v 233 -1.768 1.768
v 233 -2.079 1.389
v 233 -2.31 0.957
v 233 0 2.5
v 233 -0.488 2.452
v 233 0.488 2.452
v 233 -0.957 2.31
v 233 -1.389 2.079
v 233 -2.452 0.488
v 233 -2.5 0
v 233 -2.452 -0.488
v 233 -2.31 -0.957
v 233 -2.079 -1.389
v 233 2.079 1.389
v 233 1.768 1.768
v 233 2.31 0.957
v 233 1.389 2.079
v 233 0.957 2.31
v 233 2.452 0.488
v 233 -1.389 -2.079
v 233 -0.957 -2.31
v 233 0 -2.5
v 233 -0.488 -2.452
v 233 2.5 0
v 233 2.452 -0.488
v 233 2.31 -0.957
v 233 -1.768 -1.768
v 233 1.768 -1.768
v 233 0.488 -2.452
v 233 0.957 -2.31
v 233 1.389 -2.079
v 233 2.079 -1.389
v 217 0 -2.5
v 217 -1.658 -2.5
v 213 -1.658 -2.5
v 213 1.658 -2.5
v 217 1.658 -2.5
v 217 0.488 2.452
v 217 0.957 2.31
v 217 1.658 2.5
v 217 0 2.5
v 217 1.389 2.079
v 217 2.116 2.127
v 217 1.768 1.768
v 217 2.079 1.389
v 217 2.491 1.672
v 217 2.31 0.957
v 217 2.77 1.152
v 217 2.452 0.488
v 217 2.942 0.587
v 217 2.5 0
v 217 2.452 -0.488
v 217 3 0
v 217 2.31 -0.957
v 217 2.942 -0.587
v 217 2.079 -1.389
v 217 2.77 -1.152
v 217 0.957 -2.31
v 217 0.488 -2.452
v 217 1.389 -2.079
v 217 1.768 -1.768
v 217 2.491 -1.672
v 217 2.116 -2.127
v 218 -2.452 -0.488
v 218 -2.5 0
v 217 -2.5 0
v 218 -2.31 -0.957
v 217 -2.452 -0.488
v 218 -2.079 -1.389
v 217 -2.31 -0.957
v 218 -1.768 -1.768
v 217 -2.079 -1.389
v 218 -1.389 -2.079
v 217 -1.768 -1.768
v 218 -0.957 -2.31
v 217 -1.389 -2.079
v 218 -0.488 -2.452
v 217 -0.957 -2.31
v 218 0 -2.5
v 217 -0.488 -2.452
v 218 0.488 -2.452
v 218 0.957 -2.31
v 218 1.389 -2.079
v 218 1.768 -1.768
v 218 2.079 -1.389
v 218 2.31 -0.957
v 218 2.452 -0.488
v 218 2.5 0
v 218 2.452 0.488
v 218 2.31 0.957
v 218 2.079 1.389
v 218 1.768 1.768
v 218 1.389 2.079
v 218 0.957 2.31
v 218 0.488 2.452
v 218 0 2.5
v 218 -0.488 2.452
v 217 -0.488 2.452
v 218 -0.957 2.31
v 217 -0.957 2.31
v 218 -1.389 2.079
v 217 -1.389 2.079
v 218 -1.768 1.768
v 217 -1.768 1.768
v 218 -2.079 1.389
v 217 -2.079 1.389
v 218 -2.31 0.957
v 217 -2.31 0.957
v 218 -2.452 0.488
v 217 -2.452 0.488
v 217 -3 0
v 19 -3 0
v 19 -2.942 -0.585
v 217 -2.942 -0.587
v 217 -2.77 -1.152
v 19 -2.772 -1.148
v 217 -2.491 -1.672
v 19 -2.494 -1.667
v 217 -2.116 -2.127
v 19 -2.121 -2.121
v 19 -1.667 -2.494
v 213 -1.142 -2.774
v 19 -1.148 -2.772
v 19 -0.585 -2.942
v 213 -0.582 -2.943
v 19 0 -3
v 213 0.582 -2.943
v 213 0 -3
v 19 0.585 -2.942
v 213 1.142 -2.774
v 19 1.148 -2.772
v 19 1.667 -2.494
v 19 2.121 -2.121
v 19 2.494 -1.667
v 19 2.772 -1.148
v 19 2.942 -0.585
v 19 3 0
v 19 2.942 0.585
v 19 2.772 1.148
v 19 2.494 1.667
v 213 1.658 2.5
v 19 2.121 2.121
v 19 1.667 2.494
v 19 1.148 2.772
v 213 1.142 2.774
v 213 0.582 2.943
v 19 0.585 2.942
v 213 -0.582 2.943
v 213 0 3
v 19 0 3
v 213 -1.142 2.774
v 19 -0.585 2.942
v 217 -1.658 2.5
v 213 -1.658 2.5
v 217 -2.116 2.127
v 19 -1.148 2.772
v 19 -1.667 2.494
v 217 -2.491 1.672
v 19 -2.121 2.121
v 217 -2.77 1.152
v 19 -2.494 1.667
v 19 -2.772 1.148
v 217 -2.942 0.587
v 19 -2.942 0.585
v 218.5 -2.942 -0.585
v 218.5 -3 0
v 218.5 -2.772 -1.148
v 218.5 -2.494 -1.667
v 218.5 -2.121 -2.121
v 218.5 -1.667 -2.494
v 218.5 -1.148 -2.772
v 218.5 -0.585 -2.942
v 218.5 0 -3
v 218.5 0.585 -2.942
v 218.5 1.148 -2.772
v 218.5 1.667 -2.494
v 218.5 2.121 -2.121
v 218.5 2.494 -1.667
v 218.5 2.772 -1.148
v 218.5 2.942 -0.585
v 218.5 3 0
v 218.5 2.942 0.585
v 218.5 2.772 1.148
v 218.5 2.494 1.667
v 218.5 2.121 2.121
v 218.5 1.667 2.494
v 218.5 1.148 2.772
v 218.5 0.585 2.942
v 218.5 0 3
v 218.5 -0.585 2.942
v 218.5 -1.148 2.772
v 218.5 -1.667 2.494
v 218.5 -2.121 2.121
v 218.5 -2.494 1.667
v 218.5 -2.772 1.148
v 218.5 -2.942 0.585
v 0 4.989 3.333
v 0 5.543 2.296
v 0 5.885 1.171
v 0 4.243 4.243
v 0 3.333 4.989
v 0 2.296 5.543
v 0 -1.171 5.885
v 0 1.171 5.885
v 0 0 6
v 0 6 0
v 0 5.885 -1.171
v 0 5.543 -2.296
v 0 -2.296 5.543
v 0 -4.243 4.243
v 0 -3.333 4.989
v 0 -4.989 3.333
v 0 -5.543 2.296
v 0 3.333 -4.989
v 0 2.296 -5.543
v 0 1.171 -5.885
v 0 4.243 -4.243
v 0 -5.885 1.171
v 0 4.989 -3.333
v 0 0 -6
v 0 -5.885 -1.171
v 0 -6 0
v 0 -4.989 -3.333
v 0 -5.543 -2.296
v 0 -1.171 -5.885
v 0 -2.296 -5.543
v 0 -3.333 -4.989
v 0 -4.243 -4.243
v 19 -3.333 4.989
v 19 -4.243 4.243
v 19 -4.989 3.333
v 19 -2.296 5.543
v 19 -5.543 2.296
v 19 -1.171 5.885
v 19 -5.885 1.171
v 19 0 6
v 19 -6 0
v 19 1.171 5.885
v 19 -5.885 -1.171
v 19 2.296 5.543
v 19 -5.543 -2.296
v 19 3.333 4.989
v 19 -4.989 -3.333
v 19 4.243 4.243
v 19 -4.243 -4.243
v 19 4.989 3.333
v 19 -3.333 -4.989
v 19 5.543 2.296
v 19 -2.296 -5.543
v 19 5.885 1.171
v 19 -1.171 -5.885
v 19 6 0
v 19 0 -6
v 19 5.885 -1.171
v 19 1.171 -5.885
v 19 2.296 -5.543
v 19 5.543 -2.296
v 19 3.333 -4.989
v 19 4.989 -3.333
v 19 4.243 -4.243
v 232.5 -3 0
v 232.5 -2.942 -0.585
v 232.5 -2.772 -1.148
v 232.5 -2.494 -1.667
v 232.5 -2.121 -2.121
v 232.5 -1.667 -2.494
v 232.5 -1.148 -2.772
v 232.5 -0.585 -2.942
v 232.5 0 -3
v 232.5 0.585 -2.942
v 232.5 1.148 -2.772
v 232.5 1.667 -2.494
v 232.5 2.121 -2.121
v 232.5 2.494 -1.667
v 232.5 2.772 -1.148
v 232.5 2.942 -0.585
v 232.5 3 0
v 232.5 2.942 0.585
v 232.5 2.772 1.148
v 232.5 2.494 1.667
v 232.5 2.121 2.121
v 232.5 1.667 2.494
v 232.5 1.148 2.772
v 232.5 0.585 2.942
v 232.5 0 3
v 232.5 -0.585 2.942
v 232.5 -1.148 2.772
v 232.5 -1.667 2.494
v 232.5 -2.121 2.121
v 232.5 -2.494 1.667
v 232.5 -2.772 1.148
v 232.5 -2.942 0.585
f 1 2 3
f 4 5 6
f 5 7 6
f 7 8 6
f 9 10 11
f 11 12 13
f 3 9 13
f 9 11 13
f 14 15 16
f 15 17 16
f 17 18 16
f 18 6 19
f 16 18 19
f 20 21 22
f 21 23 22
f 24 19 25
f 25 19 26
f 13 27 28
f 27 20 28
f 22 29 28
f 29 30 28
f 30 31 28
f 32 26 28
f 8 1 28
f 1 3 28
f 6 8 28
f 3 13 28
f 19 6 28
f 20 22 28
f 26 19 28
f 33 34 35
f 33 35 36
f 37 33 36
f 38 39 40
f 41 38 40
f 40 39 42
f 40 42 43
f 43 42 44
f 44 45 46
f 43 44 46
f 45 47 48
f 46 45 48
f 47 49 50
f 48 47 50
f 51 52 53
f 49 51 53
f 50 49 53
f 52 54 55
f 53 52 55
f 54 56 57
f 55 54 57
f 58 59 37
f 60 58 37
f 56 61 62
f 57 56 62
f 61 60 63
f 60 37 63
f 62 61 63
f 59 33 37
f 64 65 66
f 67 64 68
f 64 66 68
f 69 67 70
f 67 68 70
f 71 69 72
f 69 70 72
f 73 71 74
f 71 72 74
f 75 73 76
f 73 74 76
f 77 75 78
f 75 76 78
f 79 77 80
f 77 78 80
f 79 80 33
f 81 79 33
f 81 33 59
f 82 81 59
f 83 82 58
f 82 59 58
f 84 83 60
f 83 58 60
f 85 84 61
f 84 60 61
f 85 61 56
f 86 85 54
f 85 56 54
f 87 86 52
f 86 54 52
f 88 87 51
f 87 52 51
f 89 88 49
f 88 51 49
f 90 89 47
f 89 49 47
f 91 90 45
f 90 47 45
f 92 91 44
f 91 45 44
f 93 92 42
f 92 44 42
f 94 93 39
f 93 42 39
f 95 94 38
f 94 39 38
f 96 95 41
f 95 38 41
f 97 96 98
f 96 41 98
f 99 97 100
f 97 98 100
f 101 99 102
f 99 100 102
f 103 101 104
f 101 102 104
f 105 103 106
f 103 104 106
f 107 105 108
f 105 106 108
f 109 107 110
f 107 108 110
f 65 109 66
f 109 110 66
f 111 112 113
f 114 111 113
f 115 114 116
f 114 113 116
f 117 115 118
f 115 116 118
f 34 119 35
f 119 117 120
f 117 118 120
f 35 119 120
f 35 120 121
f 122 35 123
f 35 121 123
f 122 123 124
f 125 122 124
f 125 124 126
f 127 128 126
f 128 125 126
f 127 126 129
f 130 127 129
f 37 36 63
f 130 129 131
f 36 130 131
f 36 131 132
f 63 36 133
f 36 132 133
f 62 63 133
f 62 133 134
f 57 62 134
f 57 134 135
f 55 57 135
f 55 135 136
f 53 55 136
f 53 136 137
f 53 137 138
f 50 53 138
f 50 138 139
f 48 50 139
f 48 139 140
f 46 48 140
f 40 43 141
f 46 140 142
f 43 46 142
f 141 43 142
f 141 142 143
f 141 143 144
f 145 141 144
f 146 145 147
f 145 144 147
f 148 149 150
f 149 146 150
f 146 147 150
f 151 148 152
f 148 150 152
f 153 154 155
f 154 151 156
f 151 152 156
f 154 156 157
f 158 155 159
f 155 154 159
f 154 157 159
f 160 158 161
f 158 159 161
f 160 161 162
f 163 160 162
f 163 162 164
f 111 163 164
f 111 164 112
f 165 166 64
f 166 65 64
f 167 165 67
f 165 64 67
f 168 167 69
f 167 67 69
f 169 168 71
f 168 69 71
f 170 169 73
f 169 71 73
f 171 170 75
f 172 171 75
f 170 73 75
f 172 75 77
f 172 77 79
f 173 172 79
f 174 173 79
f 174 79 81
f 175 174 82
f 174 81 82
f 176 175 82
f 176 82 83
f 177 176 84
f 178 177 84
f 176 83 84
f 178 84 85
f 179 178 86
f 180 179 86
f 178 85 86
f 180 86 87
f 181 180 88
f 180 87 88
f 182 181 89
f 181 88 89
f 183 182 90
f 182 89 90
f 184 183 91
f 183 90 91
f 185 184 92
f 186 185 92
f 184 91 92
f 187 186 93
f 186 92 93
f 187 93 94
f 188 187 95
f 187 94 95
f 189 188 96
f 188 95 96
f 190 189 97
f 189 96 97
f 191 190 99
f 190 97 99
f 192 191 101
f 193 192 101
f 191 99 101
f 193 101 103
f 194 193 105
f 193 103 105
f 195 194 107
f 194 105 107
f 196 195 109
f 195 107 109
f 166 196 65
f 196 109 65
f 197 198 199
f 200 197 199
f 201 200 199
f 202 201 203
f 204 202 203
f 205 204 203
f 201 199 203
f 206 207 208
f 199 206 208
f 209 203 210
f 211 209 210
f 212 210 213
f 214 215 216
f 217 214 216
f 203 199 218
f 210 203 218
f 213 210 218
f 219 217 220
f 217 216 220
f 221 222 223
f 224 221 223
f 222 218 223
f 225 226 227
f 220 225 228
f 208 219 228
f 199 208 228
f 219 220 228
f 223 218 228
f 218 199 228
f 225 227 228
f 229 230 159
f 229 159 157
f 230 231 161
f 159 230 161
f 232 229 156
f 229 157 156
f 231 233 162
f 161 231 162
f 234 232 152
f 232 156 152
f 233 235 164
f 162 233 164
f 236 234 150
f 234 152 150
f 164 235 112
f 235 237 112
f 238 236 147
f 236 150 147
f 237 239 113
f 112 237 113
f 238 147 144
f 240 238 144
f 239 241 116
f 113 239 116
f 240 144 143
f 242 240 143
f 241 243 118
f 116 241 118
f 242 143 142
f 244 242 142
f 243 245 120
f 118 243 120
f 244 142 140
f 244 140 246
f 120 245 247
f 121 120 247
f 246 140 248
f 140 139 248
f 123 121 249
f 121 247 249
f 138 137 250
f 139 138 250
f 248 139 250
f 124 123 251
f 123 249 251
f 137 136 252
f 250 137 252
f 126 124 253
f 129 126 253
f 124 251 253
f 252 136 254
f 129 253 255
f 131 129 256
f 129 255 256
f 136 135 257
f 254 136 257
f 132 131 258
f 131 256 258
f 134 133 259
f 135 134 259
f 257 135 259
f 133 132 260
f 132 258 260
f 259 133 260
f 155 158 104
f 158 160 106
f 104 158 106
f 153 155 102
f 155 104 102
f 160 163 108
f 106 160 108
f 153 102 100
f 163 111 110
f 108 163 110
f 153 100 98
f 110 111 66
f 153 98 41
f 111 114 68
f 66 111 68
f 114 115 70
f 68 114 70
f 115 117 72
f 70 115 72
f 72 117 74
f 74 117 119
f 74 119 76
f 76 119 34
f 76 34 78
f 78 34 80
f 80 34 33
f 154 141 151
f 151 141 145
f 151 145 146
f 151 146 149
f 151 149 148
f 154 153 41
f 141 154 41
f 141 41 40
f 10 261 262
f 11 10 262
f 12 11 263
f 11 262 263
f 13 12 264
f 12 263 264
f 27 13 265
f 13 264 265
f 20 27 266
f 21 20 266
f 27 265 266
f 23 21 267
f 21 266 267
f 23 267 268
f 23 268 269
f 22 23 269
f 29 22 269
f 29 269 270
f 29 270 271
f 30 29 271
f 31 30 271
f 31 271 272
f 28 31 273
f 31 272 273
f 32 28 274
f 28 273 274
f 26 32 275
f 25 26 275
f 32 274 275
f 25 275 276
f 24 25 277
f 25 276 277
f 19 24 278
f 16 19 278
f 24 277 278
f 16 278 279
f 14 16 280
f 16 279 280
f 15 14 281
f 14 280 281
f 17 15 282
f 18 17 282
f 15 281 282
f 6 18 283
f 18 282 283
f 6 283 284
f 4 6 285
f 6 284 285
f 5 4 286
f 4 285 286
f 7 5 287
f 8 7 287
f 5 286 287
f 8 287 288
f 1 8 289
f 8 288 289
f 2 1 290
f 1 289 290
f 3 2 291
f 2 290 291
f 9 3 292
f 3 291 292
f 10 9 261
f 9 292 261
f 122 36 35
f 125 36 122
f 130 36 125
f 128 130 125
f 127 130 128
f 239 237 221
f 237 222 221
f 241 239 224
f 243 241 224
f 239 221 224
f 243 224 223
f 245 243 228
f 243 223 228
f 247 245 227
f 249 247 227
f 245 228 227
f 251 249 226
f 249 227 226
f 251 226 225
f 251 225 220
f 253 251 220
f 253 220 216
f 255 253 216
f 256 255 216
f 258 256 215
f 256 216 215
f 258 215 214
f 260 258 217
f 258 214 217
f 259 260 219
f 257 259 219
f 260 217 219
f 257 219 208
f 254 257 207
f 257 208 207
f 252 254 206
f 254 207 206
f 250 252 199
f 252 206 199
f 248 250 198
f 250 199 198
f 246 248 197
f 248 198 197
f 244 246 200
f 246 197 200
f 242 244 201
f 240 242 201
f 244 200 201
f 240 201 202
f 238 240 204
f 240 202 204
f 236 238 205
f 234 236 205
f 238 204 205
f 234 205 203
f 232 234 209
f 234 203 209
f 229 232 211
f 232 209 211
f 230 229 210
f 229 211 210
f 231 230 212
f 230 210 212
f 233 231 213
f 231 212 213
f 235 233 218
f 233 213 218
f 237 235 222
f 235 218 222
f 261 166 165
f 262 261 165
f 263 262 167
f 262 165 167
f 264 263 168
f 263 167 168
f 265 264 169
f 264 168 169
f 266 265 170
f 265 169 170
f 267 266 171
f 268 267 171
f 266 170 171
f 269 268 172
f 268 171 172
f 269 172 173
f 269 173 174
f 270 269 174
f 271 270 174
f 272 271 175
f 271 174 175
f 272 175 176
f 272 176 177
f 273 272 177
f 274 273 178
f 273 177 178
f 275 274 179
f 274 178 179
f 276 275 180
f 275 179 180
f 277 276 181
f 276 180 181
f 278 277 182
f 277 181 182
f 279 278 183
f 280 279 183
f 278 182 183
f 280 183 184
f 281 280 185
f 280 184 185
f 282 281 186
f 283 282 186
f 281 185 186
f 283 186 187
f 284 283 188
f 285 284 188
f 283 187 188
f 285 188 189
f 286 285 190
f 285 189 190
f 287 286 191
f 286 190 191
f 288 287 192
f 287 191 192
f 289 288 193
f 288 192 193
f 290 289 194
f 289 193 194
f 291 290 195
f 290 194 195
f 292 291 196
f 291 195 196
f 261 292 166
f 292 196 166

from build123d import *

# Parameters (mm, degrees)
CHAMFER1_SIZE      = 0.5
SKETCH2_W          = 3.5
SKETCH2_H          = 12
CUT_EXTRUDE1_DEPTH = 4


with BuildPart() as part:
    # Sketch1 → Revolve1 (revolve)
    with BuildSketch(Plane.XY):
        Polygon((0, -6), (0, 0), (233, 0), (233, -3), (218.5, -3), (218, -2.5), (217, -2.5), (217, -3), (19, -3), (19, -6), align=None)
    revolve(axis=Axis((-26.391164048, 0, 0), (1, 0, 0)))

    # Chamfer1
    chamfer1_edges = [part.edges().sort_by_distance(p)[0] for p in [
        (233, 3, 0),
    ]]
    chamfer(chamfer1_edges, length=CHAMFER1_SIZE)

    # Sketch2 → Cut-Extrude1 (cut)
    with BuildSketch(Plane(origin=(217, 0, 0), x_dir=(0, 0, -1), z_dir=(1, 0, 0))):
        with Locations((-4.25, 0)):
            Rectangle(SKETCH2_W, SKETCH2_H)
    cut_extrude1 = extrude(amount=-CUT_EXTRUDE1_DEPTH, mode=Mode.SUBTRACT)

    # Mirror1: Cut-Extrude1 across plane
    add(cut_extrude1.mirror(Plane.XY), mode=Mode.SUBTRACT)


solid = part.part
